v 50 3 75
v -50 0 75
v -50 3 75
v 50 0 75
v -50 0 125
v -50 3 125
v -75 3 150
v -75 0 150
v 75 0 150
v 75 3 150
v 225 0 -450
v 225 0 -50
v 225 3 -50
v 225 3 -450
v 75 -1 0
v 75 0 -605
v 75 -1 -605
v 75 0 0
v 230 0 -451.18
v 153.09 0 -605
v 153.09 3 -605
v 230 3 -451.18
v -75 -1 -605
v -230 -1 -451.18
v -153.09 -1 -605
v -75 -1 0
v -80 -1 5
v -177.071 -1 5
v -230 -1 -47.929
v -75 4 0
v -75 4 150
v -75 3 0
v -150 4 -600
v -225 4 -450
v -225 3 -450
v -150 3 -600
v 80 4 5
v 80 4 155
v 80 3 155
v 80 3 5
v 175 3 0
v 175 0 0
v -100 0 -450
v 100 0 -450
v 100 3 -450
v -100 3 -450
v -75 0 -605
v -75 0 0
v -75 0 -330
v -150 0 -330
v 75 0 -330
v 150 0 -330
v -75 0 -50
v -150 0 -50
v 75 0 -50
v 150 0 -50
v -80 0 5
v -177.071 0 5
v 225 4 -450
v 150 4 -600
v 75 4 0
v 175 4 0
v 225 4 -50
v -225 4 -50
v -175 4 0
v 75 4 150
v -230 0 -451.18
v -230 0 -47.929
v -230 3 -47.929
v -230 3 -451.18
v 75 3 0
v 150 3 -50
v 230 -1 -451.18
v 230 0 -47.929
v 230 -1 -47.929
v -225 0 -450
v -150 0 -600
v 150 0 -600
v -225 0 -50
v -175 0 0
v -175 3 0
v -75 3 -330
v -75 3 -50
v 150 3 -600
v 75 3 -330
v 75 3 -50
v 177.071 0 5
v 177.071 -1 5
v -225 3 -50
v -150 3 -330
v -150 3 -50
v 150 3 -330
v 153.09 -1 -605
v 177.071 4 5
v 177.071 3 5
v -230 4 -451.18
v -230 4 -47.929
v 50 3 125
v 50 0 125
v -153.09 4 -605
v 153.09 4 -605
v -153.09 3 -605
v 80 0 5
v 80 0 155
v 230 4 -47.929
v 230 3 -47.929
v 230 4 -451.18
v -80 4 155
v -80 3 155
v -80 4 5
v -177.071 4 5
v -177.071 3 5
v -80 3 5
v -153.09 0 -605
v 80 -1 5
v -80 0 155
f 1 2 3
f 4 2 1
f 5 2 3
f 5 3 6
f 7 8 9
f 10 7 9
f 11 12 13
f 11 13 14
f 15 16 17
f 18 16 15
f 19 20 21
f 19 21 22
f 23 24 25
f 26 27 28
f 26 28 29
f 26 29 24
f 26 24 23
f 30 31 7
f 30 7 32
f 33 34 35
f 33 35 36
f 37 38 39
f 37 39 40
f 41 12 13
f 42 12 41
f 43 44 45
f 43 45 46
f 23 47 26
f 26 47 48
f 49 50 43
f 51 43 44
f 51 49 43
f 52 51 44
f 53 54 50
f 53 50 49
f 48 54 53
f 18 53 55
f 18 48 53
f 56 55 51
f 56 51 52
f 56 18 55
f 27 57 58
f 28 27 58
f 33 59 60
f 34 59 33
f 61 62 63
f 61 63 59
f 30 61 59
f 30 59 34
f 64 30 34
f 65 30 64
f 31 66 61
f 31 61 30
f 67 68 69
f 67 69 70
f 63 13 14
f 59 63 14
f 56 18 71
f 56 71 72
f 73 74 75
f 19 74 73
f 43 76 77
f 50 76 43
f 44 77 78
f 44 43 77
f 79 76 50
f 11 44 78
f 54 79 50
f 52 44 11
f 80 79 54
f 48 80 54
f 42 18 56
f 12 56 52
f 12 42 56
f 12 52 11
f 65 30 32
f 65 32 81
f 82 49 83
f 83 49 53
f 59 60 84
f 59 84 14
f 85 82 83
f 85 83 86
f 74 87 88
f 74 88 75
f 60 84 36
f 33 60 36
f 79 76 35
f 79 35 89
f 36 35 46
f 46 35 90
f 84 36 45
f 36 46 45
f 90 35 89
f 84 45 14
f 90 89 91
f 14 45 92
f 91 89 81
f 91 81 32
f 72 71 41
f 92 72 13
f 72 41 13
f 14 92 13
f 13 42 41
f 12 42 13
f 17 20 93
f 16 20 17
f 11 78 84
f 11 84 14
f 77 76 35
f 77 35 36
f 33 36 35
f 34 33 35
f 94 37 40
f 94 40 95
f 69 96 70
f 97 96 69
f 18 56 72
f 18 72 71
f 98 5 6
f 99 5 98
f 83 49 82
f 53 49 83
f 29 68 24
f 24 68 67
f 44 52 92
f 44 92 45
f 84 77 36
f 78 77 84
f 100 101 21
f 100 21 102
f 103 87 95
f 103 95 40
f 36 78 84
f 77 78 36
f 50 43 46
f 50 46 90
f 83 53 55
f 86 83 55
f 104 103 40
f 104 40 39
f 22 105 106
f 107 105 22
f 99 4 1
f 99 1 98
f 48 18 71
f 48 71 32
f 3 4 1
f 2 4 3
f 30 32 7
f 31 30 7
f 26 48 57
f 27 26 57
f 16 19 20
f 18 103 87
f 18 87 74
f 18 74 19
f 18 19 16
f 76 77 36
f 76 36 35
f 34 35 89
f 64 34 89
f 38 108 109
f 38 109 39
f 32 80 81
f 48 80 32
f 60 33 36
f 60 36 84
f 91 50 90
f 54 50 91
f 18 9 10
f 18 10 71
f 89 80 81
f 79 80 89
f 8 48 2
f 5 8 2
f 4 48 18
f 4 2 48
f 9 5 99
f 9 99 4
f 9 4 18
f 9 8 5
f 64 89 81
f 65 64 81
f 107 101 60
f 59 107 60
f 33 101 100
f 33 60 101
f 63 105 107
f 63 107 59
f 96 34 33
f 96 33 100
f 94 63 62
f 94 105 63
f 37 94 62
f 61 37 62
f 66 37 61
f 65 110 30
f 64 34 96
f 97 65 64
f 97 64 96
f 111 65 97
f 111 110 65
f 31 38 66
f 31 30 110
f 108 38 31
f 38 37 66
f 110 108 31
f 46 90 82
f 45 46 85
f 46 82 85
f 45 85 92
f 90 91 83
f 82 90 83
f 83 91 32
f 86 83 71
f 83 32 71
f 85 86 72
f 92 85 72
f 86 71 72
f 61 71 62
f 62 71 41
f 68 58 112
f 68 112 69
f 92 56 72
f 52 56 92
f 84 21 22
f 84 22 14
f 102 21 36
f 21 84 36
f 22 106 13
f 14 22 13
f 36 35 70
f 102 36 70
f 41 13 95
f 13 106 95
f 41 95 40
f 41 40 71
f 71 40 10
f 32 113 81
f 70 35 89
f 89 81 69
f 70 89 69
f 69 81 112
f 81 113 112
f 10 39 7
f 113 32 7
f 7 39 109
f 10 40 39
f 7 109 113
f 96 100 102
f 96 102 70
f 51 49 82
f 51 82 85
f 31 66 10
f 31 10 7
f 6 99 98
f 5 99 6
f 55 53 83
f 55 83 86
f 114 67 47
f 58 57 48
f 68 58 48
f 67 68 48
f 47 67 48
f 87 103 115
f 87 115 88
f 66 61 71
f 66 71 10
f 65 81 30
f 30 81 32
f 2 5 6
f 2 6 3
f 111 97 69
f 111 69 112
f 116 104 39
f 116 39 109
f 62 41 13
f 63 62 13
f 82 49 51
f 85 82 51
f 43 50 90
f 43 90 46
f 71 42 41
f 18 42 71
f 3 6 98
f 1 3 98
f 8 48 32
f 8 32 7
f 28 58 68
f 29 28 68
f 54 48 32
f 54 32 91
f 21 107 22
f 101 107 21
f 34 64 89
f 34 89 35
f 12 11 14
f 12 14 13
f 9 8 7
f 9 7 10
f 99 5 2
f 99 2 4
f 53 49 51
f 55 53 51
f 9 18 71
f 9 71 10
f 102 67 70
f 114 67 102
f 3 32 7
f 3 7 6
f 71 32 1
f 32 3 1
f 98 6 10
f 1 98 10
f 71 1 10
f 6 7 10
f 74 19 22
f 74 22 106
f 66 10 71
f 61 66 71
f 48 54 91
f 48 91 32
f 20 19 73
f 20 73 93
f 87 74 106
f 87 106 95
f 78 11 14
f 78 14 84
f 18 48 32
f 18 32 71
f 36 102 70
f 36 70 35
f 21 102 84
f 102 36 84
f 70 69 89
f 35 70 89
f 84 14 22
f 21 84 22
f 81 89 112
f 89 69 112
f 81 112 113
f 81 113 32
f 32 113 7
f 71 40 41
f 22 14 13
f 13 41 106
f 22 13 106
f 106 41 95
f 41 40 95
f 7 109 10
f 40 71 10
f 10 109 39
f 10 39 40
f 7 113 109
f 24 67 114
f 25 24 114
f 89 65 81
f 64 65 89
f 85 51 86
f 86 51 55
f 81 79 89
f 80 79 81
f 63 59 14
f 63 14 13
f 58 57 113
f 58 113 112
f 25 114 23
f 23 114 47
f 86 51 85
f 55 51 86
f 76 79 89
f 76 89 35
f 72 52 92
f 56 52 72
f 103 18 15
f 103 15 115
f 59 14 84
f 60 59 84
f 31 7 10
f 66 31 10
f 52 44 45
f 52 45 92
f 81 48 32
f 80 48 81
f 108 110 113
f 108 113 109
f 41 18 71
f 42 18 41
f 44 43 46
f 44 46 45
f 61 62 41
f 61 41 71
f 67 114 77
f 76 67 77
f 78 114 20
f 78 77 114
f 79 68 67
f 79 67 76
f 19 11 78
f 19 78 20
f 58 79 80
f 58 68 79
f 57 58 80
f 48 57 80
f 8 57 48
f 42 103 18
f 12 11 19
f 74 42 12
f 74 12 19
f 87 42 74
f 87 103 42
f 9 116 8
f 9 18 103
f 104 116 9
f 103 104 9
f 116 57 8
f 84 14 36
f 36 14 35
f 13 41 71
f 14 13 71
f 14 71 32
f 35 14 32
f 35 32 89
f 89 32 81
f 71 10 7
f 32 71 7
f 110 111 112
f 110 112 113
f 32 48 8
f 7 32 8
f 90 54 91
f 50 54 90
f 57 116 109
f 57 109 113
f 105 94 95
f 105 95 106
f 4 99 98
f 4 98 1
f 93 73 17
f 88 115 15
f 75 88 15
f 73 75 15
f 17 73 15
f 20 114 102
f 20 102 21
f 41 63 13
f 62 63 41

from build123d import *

# Parameters (mm, degrees)
F1_DEPTH  = 3
F2_W      = 150
F2_H      = 150
F3_DEPTH  = 3
F4_W      = 150
F4_H      = 280
F5_DEPTH  = 3
F6_W      = 150
F6_H      = 280
F7_DEPTH  = 3
F9_DEPTH  = 3
F11_DEPTH = 3
F13_DEPTH = 1
F15_DEPTH = 1
F17_DEPTH = 1


with BuildPart() as f1:
    # F0 (on Front) → F1 (new body)
    with BuildSketch(Plane.XZ):
        Polygon((50, 125), (0, 125), (-50, 125), (-50, 100), (-50, 75), (0, 75), (50, 75), (50, 100), align=None)
    extrude(amount=-F1_DEPTH)


with BuildPart() as f3:
    # F2 (on Front) → F3 (new body)
    with BuildSketch(Plane.XZ):
        with Locations((0, 75)):
            Rectangle(F2_W, F2_H)
        Polygon((-50, 125), (0, 125), (50, 125), (50, 100), (50, 75), (0, 75), (-50, 75), (-50, 100), align=None, mode=Mode.SUBTRACT)
    extrude(amount=-F3_DEPTH)


with BuildPart() as f5:
    # F4 (on Front) → F5 (new body)
    with BuildSketch(Plane.XZ):
        with Locations((0, -190)):
            Rectangle(F4_W, F4_H)
    extrude(amount=-F5_DEPTH)


with BuildPart() as f7:
    # F6 (on Front) → F7 (new body)
    with BuildSketch(Plane.XZ):
        Polygon((75, 0), (-75, 0), (-150, -50), (-150, -330), (-100, -450), (100, -450), (150, -330), (150, -50), align=None)
        with Locations((0, -190)):
            Rectangle(F6_W, F6_H, mode=Mode.SUBTRACT)
    extrude(amount=-F7_DEPTH)


with BuildPart() as f9:
    # F8 (on face) → F9 (new body)
    with BuildSketch(Plane.XZ):
        Polygon((175, 0), (75, 0), (150, -50), (150, -330), (100, -450), (-100, -450), (-150, -330), (-150, -50), (-75, 0), (-175, 0), (-225, -50), (-225, -450), (-150, -600), (150, -600), (225, -450), (225, -50), align=None)
    extrude(amount=-F9_DEPTH)


with BuildPart() as f11:
    # F10 (on face) → F11 (new body)
    with BuildSketch(Plane.XZ):
        Polygon((230, -47.928932), (177.071068, 5), (80, 5), (80, 155), (-80, 155), (-80, 5), (-177.071068, 5), (-230, -47.928932), (-230, -451.18034), (-153.09017, -605), (153.09017, -605), (230, -451.18034), align=None)
        Polygon((-75, 150), (75, 150), (75, 0), (175, 0), (225, -50), (225, -450), (150, -600), (-150, -600), (-225, -450), (-225, -50), (-175, 0), (-75, 0), align=None, mode=Mode.SUBTRACT)
    extrude(amount=-F11_DEPTH)


with BuildPart() as f13:
    # F12 (on face) → F13 (new body)
    with BuildSketch(Plane(origin=(0, 3, 0), x_dir=(-1, 0, 0), z_dir=(0, 1, 0))):
        Polygon((75, 0), (75, 150), (-75, 150), (-75, 0), (-175, 0), (-225, -50), (-225, -450), (-150, -600), (150, -600), (225, -450), (225, -50), (175, 0), align=None)
    extrude(amount=F13_DEPTH)


with BuildPart() as f15:
    # F14 (on face) → F15 (new body)
    with BuildSketch(Plane(origin=(0, 4, 0), x_dir=(-1, 0, 0), z_dir=(0, 1, 0))):
        Polygon((80, 155), (-80, 155), (-80, 5), (-177.071068, 5), (-230, -47.928932), (-230, -451.18034), (-153.09017, -605), (153.09017, -605), (230, -451.18034), (230, -47.928932), (177.071068, 5), (80, 5), align=None)
        Polygon((-75, 0), (-75, 150), (75, 150), (75, 0), (175, 0), (225, -50), (225, -450), (150, -600), (-150, -600), (-225, -450), (-225, -50), (-175, 0), align=None, mode=Mode.SUBTRACT)
    extrude(amount=-F15_DEPTH)


with BuildPart() as f17:
    # F16 (on face) → F17 (new body)
    with BuildSketch(Plane.XZ):
        Polygon((-153.09017, -605), (-75, -605), (-75, 0), (-80, 5), (-177.071068, 5), (-230, -47.928932), (-230, -451.18034), align=None)
    extrude(amount=F17_DEPTH)


with BuildPart() as f18_1:
    # F18: instance of F17
    add(f17.part.mirror(Plane.YZ))


solid = Compound([f1.part, f3.part, f5.part, f7.part, f9.part, f11.part, f13.part, f15.part, f17.part, f18_1.part])
